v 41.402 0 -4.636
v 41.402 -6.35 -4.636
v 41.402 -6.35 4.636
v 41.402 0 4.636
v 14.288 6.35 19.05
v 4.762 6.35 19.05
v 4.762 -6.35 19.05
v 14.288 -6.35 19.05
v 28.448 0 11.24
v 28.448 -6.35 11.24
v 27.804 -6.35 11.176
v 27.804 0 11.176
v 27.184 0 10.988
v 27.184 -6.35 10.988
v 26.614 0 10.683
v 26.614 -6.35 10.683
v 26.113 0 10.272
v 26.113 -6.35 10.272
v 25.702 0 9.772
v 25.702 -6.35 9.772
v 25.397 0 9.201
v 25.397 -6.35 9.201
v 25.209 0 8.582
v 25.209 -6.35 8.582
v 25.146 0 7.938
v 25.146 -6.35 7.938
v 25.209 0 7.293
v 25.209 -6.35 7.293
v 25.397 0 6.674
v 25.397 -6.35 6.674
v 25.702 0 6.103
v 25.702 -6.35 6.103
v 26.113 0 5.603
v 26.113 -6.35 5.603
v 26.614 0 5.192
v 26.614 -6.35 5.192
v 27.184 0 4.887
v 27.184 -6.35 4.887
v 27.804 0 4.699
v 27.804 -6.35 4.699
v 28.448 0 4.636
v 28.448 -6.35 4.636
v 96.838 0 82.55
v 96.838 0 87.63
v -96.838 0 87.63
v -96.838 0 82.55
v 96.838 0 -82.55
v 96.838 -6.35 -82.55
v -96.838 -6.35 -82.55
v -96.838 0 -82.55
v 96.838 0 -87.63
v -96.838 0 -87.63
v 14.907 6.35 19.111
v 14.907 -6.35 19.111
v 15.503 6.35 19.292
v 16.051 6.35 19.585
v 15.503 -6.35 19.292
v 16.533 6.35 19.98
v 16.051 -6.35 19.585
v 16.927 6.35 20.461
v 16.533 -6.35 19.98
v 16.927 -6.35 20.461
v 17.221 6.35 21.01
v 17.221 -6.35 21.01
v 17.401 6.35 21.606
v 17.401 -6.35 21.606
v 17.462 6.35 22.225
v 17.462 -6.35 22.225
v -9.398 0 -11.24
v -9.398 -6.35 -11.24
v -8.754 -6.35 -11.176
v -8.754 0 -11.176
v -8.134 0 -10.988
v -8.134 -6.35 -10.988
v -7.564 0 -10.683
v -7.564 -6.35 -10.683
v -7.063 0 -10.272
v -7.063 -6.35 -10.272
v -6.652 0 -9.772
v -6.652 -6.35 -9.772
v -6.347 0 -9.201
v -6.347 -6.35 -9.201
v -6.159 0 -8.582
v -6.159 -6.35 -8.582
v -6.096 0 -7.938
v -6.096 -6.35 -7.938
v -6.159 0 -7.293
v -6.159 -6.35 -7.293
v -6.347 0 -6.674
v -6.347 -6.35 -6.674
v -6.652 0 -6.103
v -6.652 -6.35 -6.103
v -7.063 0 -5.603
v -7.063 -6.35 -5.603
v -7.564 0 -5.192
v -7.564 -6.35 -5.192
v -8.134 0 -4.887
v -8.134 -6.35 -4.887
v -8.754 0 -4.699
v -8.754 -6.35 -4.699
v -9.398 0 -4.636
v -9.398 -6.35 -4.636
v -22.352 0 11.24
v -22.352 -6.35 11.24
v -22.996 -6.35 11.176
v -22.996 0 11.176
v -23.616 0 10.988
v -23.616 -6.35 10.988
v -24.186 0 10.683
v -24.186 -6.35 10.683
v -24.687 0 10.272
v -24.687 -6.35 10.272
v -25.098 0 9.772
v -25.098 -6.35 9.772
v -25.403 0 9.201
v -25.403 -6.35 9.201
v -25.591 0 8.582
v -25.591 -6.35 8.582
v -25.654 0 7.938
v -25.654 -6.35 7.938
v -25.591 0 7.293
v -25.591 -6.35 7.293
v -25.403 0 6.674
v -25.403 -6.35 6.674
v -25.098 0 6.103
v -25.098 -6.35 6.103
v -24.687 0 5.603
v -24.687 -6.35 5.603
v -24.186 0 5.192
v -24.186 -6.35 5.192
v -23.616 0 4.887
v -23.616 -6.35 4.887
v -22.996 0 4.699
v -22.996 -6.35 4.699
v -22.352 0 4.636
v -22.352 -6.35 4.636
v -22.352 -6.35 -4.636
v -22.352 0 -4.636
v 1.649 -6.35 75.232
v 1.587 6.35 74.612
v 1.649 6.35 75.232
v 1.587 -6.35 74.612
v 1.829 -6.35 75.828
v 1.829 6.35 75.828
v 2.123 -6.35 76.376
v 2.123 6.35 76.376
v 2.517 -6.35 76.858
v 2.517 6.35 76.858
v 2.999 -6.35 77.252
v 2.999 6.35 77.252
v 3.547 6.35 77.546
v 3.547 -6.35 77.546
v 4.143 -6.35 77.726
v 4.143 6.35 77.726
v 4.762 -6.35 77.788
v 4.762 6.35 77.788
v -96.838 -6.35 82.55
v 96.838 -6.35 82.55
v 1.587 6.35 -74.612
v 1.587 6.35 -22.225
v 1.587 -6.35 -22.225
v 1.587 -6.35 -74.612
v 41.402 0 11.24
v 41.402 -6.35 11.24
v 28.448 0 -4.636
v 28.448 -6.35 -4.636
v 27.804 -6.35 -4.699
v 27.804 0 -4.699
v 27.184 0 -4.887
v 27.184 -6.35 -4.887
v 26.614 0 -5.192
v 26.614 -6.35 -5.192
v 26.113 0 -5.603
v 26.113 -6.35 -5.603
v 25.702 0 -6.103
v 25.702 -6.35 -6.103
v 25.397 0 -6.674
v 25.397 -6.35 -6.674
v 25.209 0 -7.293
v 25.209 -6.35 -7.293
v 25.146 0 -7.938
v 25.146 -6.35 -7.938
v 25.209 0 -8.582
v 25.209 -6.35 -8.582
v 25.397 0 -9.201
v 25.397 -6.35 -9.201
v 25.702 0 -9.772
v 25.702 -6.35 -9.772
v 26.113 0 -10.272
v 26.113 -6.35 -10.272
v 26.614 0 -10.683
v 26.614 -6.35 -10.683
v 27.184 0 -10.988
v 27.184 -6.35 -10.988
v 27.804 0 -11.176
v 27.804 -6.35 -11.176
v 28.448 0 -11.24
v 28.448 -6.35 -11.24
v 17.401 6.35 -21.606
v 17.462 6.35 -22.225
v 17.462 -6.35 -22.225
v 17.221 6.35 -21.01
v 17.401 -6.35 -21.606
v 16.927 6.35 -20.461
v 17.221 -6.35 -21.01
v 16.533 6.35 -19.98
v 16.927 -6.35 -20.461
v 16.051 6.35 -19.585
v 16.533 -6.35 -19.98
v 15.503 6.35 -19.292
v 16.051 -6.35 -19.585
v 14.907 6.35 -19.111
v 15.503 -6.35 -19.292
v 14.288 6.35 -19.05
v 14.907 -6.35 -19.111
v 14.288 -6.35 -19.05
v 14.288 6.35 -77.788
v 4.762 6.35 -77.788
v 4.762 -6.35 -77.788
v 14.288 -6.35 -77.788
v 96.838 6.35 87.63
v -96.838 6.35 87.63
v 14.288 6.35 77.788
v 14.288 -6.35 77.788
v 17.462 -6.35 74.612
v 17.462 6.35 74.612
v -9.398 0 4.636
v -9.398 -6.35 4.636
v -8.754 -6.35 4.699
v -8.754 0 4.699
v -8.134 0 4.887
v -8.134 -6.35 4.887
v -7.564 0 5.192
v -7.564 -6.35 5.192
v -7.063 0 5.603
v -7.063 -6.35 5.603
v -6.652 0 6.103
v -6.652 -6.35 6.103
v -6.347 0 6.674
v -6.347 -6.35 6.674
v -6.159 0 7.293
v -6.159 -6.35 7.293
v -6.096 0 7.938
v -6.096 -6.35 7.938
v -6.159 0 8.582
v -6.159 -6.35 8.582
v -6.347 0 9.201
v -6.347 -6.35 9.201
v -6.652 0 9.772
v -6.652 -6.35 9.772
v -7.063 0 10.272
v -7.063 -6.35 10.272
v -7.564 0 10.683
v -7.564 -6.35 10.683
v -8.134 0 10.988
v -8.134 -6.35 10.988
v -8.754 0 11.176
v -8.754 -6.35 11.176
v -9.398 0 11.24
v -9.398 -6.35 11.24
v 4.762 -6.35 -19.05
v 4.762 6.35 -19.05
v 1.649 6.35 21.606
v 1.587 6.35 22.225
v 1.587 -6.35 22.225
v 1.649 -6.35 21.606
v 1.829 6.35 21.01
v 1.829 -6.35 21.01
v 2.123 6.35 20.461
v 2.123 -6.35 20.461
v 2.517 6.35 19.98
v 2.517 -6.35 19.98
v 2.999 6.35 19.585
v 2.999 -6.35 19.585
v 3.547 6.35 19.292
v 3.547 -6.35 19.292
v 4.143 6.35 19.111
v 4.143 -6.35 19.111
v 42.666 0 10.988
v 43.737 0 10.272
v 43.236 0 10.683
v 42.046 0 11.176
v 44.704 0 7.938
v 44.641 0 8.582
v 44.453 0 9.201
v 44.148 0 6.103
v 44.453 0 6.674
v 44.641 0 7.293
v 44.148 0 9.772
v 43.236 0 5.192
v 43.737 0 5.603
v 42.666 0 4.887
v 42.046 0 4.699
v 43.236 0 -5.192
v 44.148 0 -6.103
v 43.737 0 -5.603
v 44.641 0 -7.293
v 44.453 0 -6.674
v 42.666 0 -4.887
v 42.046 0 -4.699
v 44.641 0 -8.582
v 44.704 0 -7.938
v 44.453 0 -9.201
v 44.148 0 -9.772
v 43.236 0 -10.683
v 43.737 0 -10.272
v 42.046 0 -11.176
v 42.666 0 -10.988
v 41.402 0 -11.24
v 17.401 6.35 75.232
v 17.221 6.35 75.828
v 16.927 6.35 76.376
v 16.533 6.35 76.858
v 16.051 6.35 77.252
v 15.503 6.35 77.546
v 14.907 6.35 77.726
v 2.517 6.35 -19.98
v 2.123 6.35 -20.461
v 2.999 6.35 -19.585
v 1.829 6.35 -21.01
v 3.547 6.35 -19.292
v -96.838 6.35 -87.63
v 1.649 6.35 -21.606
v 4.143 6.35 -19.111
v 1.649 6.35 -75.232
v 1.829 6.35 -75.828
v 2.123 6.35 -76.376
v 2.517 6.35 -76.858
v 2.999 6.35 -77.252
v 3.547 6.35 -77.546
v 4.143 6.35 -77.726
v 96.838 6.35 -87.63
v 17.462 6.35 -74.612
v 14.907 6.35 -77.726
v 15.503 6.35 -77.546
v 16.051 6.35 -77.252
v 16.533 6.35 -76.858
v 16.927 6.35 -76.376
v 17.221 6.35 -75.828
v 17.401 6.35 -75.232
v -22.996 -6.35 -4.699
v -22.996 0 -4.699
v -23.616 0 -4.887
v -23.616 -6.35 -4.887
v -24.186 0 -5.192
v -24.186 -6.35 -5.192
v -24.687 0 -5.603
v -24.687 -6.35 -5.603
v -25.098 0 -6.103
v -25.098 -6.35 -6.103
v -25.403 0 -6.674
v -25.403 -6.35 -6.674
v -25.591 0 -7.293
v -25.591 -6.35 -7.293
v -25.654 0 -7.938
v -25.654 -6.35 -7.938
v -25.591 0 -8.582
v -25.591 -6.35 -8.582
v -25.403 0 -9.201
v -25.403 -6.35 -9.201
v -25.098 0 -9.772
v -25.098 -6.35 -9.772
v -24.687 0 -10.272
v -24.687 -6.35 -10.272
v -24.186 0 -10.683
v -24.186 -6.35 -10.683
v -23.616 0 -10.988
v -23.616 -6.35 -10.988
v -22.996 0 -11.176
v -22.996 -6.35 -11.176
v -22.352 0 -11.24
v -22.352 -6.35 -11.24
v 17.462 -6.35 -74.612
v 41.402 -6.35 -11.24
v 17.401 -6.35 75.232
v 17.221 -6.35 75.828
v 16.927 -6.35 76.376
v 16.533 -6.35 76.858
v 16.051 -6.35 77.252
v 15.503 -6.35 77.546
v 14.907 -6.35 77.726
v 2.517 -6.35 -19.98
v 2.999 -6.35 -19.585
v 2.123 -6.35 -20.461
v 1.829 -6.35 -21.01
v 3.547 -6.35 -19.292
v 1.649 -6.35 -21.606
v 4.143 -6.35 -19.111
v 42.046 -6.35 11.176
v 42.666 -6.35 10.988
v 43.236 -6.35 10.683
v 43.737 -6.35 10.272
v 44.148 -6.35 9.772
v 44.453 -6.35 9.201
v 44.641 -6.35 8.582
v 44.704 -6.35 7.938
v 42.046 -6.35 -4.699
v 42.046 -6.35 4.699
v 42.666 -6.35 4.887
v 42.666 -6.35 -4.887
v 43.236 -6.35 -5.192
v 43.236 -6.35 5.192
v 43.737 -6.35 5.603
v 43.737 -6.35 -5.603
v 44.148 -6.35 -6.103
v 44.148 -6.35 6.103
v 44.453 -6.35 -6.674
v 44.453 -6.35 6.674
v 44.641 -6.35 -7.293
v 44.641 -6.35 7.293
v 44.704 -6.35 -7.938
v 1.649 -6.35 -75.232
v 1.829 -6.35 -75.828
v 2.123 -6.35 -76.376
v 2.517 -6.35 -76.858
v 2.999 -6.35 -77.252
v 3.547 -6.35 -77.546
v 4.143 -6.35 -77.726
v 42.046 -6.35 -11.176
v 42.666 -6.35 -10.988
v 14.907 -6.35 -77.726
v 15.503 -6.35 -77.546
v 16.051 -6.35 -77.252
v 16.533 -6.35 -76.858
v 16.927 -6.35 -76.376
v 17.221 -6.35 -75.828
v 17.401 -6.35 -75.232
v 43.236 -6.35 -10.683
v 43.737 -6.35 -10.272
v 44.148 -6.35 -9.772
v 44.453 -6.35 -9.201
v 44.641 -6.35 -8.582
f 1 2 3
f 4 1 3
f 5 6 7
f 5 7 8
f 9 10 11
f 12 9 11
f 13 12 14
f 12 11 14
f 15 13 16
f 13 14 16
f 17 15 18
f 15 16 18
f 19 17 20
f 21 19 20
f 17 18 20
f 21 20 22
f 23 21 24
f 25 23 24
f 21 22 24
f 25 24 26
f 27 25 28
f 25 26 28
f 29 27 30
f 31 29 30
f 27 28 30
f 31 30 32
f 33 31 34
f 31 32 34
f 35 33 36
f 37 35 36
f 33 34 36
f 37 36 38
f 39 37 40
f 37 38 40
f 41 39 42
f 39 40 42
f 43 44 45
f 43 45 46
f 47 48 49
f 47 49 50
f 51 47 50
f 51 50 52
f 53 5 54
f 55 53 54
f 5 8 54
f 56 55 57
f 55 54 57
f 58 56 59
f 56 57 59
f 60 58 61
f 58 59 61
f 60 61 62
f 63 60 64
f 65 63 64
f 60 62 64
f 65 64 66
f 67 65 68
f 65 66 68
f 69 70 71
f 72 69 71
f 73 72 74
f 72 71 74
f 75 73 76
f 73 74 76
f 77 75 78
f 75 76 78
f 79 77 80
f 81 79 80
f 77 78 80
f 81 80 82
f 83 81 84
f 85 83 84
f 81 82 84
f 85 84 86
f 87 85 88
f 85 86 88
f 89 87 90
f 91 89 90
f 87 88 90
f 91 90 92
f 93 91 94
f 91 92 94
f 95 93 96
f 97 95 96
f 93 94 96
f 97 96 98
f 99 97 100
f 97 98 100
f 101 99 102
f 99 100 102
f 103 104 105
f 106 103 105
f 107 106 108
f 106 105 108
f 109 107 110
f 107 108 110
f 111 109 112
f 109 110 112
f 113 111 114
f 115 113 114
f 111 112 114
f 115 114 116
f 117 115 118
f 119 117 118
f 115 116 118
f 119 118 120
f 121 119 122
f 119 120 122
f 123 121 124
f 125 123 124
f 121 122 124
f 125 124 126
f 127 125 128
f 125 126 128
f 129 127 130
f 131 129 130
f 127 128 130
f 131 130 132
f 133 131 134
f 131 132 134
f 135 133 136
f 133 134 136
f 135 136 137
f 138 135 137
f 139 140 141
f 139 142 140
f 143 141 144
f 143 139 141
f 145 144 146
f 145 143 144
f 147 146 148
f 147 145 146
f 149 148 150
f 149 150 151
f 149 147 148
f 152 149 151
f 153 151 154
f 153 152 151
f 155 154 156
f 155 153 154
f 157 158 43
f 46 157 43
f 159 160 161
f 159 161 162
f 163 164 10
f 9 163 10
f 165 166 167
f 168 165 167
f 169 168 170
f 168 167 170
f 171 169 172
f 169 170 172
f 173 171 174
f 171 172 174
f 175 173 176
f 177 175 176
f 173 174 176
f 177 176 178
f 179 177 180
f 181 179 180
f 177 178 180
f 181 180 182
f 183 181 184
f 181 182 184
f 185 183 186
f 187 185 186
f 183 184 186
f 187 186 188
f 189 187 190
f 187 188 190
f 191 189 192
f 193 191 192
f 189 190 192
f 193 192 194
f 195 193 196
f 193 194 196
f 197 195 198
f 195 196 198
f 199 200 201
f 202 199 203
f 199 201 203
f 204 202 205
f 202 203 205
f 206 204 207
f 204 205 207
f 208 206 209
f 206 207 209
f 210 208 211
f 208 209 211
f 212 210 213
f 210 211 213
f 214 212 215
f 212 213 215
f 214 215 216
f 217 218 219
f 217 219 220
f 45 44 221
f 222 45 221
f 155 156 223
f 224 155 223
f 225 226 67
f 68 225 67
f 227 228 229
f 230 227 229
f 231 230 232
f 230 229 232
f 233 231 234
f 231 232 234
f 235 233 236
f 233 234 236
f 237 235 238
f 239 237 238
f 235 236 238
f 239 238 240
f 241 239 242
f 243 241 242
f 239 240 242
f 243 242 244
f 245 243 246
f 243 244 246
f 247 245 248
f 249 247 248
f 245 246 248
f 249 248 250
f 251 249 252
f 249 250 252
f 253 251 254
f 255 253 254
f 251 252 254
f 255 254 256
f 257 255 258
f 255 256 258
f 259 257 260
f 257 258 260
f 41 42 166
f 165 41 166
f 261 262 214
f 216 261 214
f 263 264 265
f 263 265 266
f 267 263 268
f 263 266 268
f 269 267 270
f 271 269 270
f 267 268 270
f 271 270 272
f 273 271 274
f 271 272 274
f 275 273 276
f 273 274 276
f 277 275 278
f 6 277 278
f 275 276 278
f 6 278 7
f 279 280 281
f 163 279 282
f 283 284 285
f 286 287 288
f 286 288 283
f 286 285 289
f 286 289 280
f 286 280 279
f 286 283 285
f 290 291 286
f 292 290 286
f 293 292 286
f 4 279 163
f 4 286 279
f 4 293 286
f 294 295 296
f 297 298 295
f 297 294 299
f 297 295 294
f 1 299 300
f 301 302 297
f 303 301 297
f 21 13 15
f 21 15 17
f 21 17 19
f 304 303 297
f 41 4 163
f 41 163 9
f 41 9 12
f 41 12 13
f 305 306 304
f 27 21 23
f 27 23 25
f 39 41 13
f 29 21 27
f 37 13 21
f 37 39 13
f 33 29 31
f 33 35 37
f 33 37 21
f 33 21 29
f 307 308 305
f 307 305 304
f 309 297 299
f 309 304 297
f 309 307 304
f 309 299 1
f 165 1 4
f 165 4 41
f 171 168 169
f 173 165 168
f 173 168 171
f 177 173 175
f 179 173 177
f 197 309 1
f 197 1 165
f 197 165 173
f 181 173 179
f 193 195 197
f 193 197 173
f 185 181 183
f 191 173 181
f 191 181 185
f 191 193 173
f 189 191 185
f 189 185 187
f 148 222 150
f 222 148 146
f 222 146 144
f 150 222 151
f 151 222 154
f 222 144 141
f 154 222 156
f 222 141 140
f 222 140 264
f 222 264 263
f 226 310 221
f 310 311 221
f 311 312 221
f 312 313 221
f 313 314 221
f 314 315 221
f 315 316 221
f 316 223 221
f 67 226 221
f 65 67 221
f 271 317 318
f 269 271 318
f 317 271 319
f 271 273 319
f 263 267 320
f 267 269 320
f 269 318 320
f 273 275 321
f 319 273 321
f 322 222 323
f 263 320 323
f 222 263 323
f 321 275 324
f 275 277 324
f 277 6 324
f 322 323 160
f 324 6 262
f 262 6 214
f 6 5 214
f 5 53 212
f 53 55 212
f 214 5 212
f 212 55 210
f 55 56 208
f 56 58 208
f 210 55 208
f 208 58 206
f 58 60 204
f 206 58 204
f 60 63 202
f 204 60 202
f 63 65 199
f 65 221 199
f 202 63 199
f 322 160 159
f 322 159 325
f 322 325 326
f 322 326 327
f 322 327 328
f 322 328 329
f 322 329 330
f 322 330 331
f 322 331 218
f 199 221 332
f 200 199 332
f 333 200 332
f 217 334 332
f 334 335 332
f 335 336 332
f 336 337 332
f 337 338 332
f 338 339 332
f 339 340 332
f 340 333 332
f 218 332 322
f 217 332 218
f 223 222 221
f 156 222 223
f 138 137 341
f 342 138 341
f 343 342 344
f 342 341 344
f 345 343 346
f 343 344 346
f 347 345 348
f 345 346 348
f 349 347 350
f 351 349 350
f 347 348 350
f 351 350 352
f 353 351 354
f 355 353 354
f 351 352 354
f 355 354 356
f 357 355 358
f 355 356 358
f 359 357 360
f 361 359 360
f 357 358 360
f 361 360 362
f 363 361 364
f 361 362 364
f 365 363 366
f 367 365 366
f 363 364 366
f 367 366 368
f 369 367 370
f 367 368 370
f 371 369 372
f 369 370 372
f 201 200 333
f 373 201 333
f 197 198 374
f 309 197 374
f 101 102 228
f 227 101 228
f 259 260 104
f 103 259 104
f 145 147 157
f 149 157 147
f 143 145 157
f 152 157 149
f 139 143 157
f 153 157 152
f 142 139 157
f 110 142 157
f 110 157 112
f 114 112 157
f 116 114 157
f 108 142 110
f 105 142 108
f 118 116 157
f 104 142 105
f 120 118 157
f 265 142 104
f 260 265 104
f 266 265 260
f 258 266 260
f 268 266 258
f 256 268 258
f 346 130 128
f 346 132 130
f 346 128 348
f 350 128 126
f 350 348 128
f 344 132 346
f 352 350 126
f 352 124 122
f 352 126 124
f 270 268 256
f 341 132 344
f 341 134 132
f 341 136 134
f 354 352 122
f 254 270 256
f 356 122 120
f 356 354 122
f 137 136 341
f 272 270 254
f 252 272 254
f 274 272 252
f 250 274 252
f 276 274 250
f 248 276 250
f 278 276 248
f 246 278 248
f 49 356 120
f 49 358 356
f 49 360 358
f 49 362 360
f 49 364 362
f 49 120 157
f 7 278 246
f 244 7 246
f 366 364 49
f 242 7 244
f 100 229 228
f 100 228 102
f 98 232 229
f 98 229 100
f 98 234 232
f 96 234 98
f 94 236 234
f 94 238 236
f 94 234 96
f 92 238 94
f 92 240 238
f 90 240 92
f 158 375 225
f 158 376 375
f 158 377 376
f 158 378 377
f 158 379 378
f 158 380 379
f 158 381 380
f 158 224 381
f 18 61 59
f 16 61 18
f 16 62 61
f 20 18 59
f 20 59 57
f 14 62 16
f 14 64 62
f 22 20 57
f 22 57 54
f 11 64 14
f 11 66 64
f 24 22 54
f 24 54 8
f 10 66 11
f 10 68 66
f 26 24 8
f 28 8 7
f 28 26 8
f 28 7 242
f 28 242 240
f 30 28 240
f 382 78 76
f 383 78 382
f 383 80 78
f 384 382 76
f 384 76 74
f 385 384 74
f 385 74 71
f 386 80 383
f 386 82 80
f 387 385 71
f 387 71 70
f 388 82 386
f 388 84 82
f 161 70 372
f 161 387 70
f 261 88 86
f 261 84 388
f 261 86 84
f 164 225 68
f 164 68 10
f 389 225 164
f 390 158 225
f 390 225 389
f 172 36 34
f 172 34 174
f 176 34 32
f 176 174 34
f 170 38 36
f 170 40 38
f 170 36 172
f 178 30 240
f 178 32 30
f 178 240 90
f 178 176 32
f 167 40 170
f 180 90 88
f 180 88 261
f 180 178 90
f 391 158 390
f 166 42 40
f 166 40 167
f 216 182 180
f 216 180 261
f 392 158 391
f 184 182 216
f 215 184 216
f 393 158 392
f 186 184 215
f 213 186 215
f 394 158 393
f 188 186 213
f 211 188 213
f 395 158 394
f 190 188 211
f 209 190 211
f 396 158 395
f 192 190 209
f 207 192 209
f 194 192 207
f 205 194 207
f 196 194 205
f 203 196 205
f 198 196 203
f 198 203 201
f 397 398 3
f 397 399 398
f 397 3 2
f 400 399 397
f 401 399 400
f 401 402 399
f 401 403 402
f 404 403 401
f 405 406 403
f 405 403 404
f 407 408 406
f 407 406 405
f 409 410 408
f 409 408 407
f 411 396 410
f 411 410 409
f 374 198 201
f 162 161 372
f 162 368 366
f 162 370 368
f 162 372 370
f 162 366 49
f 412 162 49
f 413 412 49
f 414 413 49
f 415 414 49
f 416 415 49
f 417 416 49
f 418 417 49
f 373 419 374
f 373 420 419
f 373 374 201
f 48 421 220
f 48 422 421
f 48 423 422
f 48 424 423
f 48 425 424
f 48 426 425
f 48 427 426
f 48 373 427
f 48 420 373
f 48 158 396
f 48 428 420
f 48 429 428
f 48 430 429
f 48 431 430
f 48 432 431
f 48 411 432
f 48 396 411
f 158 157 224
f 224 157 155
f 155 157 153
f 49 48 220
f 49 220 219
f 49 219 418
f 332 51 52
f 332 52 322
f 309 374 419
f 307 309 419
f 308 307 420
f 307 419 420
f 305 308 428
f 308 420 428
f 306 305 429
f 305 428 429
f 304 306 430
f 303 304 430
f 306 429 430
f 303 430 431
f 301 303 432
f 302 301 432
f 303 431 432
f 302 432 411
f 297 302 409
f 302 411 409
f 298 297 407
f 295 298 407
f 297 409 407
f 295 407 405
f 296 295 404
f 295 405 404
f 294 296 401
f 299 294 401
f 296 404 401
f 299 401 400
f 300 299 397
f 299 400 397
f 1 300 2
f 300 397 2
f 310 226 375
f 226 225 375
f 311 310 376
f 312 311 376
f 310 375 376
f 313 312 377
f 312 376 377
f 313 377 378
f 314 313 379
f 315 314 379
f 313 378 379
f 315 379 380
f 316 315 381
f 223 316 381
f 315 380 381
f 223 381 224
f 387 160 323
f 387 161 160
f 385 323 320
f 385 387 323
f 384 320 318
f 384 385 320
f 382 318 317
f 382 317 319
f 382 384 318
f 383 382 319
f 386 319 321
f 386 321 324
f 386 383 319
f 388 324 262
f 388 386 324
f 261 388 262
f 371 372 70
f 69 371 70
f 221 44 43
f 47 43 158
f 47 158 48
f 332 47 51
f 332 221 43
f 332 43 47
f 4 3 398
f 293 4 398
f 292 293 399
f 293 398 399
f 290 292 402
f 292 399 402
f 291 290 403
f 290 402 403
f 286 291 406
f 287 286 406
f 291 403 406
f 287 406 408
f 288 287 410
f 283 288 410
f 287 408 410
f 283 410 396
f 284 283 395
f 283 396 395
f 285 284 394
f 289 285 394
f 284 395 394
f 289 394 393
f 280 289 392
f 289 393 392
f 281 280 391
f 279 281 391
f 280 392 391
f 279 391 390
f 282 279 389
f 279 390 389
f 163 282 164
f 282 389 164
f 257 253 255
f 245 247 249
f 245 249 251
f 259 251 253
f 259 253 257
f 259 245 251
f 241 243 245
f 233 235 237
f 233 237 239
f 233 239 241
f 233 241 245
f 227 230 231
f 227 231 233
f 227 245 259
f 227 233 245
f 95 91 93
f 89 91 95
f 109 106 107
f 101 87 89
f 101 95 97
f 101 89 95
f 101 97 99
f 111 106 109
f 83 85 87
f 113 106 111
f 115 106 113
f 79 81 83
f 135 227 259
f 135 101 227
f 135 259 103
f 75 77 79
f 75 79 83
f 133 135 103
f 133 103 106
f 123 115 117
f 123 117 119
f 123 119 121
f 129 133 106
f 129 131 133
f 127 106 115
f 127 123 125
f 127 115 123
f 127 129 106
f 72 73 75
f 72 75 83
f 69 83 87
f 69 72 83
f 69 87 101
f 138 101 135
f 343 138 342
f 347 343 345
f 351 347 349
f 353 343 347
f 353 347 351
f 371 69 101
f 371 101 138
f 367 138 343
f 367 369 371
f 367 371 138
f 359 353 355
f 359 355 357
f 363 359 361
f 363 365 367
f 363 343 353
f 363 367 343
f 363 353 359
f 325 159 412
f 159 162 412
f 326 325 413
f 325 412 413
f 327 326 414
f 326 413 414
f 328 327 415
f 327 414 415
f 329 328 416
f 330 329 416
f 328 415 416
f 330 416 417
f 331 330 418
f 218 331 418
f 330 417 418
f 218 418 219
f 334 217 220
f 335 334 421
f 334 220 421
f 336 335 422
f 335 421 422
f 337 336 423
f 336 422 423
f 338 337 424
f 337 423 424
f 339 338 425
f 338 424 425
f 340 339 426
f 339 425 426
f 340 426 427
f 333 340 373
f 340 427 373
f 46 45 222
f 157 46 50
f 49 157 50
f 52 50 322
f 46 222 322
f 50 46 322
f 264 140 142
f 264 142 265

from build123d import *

# Parameters (mm, degrees)
SKETCH1_W           = 175.26
SKETCH1_H           = 12.7
BOSS_EXTRUDE1_DEPTH = 96.8375
SKETCH2_W           = 5.08
SKETCH2_H           = 6.35
CUT_EXTRUDE1_DEPTH  = 213.67191875
CUT_EXTRUDE2_DEPTH  = 6.35
SKETCH5_W           = 15.875
SKETCH5_H           = 58.7375
CUT_EXTRUDE4_DEPTH  = 132.216646453
FILLET1_R           = 3.175


with BuildPart() as part:
    # Sketch1 → Boss-Extrude1 (new, symmetric)
    with BuildSketch(Plane(origin=(0, 0, 0), x_dir=(0, 0, -1), z_dir=(1, 0, 0))):
        Rectangle(SKETCH1_W, SKETCH1_H)
    extrude(amount=BOSS_EXTRUDE1_DEPTH, both=True)

    # Sketch2 → Cut-Extrude1 (cut, through all)
    with BuildSketch(Plane(origin=(96.8375, 0, 0), x_dir=(0, 0, -1), z_dir=(1, 0, 0))):
        with Locations((-85.09, -3.175)):
            Rectangle(SKETCH2_W, SKETCH2_H)
        with Locations((85.09, -3.175)):
            Rectangle(SKETCH2_W, SKETCH2_H)
    extrude(amount=-CUT_EXTRUDE1_DEPTH, mode=Mode.SUBTRACT)

    # Sketch3 → Cut-Extrude2 (cut)
    with BuildSketch(Plane(origin=(0, -6.35, 0), x_dir=(1, 0, 0), z_dir=(0, 1, 0))):
        with BuildLine():
            Line((28.448, 11.2395), (41.402, 11.2395))
            ThreePointArc((41.402, 11.2395), (44.704, 7.9375), (41.402, 4.6355))
            Line((41.402, 4.6355), (41.402, -4.6355))
            ThreePointArc((41.402, -4.6355), (44.704, -7.9375), (41.402, -11.2395))
            Line((41.402, -11.2395), (28.448, -11.2395))
            ThreePointArc((28.448, -11.2395), (25.146, -7.9375), (28.448, -4.6355))
            Line((28.448, -4.6355), (28.448, 4.6355))
            ThreePointArc((28.448, 4.6355), (25.146, 7.9375), (28.448, 11.2395))
        make_face()
        with BuildLine():
            Line((-22.352, 11.2395), (-9.398, 11.2395))
            ThreePointArc((-9.398, 11.2395), (-6.096, 7.9375), (-9.398, 4.6355))
            Line((-9.398, 4.6355), (-9.398, -4.6355))
            ThreePointArc((-9.398, -4.6355), (-6.096, -7.9375), (-9.398, -11.2395))
            Line((-9.398, -11.2395), (-22.352, -11.2395))
            ThreePointArc((-22.352, -11.2395), (-25.654, -7.9375), (-22.352, -4.6355))
            Line((-22.352, -4.6355), (-22.352, 4.6355))
            ThreePointArc((-22.352, 4.6355), (-25.654, 7.9375), (-22.352, 11.2395))
        make_face()
    extrude(amount=CUT_EXTRUDE2_DEPTH, mode=Mode.SUBTRACT)

    # Sketch5 → Cut-Extrude4 (cut, through all)
    with BuildSketch(Plane(origin=(0, 6.35, 0), x_dir=(1, 0, 0), z_dir=(0, 1, 0))):
        with Locations((9.525, -48.41875)):
            Rectangle(SKETCH5_W, SKETCH5_H)
        with Locations((9.525, 48.41875)):
            Rectangle(SKETCH5_W, SKETCH5_H)
    extrude(amount=-CUT_EXTRUDE4_DEPTH, mode=Mode.SUBTRACT)

    # Fillet1
    fillet1_edges = [part.edges().sort_by_distance(p)[0] for p in [
        (1.5875, 0, -19.05),
        (1.5875, 0, -77.7875),
        (17.4625, 0, -77.7875),
        (17.4625, 0, -19.05),
        (1.5875, 0, 77.7875),
        (1.5875, 0, 19.05),
        (17.4625, 0, 19.05),
        (17.4625, 0, 77.7875),
    ]]
    fillet(fillet1_edges, radius=FILLET1_R)


solid = part.part
